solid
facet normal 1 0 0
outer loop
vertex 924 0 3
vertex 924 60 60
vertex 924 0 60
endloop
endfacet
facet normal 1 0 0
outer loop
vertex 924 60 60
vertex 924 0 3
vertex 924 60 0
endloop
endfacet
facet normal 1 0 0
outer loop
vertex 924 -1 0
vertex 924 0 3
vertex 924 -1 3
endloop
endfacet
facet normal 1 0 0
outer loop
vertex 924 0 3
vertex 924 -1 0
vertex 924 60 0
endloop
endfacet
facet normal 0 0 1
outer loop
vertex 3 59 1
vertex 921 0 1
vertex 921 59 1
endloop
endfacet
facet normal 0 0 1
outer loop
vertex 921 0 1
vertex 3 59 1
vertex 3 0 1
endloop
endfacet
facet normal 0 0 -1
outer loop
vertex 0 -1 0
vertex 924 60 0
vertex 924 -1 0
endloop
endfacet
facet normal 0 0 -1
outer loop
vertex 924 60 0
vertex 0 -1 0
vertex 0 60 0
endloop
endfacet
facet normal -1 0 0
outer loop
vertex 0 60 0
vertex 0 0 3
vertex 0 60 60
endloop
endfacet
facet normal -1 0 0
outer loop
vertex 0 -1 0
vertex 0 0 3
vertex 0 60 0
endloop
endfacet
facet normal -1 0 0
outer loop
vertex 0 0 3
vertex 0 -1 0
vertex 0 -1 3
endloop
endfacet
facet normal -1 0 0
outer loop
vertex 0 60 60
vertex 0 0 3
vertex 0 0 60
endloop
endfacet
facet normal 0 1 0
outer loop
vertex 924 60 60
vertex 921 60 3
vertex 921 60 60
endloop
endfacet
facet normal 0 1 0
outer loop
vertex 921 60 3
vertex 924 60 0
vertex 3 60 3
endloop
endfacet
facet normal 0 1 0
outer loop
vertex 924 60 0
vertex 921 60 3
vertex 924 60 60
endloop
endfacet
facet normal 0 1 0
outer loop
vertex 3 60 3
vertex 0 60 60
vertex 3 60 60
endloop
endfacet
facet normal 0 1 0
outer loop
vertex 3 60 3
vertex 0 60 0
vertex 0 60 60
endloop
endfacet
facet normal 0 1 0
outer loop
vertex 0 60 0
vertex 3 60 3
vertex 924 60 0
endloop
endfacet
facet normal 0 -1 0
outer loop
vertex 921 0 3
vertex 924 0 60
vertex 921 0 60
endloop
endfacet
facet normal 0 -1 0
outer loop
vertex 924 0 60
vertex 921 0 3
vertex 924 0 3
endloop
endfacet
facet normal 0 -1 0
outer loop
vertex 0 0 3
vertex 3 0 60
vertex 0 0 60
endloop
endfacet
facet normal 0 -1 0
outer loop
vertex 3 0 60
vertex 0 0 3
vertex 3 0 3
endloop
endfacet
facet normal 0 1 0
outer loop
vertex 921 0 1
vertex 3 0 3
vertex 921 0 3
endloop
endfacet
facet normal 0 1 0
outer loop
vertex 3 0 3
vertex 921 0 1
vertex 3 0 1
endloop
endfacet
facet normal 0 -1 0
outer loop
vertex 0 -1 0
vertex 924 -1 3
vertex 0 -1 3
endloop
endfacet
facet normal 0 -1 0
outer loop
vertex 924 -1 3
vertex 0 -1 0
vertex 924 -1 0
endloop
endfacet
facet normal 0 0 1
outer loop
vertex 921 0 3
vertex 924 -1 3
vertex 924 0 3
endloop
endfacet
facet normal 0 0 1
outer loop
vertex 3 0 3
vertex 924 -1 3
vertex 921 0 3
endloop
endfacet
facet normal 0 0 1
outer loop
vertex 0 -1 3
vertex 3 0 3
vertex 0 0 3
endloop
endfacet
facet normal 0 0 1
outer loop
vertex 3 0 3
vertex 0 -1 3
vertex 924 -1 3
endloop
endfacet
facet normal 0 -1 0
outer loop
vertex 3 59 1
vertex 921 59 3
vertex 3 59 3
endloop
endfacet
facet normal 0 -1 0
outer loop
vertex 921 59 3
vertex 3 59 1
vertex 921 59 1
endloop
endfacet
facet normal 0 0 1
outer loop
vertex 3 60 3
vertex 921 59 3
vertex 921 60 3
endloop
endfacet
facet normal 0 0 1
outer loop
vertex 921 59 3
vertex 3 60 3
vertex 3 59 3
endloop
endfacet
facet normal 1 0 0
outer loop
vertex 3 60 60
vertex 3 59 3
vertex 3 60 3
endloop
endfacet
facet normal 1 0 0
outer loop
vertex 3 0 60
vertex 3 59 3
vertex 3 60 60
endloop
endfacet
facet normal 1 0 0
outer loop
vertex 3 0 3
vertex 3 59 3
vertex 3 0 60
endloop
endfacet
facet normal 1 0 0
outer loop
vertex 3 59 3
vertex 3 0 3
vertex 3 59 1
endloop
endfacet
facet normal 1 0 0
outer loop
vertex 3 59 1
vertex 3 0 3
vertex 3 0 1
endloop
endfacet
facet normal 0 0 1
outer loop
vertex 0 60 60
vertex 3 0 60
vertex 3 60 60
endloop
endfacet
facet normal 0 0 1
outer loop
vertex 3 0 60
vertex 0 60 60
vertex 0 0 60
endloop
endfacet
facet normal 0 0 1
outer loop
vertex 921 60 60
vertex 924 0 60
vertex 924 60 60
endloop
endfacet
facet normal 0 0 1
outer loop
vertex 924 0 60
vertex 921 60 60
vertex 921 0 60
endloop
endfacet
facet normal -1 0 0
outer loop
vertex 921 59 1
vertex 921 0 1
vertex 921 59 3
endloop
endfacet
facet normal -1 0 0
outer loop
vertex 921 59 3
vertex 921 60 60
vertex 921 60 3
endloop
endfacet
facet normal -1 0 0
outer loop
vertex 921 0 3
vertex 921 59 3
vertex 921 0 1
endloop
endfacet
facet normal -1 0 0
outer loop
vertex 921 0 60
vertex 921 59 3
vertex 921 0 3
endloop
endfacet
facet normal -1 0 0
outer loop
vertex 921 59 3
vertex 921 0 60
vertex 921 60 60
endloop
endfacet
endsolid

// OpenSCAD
// file: grate.scad
include <../../library/profiles.scad>
include <./config.scad>


grateLength = floor(outerWidth - fireBasketWidth - (profileSize * 4) - (grateGap * 4) - ((4 * grateProfileThickness)));
grateWidth = outerDepth - profileSize - (6 * grateProfileThickness);
halfGrateLength = floor((grateLength - grateProfileThickness) / 2);

startPos = 17;

module grateTemplate(grateLength = 400, grateWidth = 400, frontProjection = false) {
    // hinten
    if (frontProjection) {
        cube([grateLength, profileSize - 5, profileSize - 5]);
    } else {
        cube([grateLength, profileSize + 5, profileSize + 5]);
    }
    // vorne
    translate([0, grateWidth - profileSize + 10 - grateGap * 2, 0])
    cube([grateLength, profileSize - 5 , profileSize - 5]);
    
    if (frontProjection) {
        // rippen
        amount = round(grateLength / 35);
        echo(str("anzahl ", amount))
        for ( i = [0 : amount - 1] ) {
            translate([(i * 35) + startPos, 0, profileSize - 5])
            rotate([45, 0, 90])
            lShapeProfile(grateWidth + 30, 20, 2);
        }
    } else {
        // rippen
        amount = round(grateLength / 35);
        echo(str("anzahl ", amount))
        for ( i = [0 : amount - 1] ) {
            translate([(i * 35) + startPos, 0, profileSize + 5])
            rotate([45, 1, 90])
            lShapeProfile(grateWidth + 30, 20, 2);
        }
    }
}

module grate() {
    grateTemplate(grateLength, grateWidth);
}

module halfGrate(frontProjection = false) {
    grateTemplate(halfGrateLength, grateWidth, frontProjection);
}

module halfGratePartsList() {
    amount = round(halfGrateLength / 35);
    echo(str("Nr,Beschreibung,Stück,Länge,Breite,Höhe"));

    // Träger
    echo(str("1,Vierkant Vorne", ",", "2", ",", halfGrateLength, ",", profileSize, ",", profileSize));
    echo(str("2,Vierkant Vorne", ",", "2", ",", halfGrateLength, ",", profileSize + 5, ",", profileSize + 5));
    // Rost
    echo(str("3,Winkel für Rost", ",", amount * 2, ",", grateWidth + 30, ",20,20"));

}


module drawHalfGrateFrontProjection() {

    // Vorne
    translate([halfGrateLength, -profileSize + 5, 0])
    projection() {
        rotate([90,0,180])
        halfGrate(frontProjection = true);
    }
}

module drawHalfGrateSideProjection() {
    translate([grateWidth + 30, -profileSize - 5, 0])
    // // Seite
    rotate([0,0,90])
    projection() {
        translate([0, 0, 0])
        rotate([0,90,0])
        halfGrate();
    }
}

module drawHalfGrateTopProjection() {
    // // Draufsicht
    translate([0, -grateWidth - 30, 0])
    projection() {
        rotate([0,0,0])
        halfGrate();
    }
}



module halfGrateMeasuermentLinesLength() {

    color([0/255, 0/255, 0/255]) translate([0, 60, 0]) {

        square([lineThickness,lineGap * 2 + 20]);

        translate([halfGrateLength, 0, 0])
        square([lineThickness,lineGap * 2 + 20]);


        amount = round(halfGrateLength / 35);

        for ( i = [0 : amount - 1] ) {
            moveX = halfGrateLength - ((i * 35) + startPos);
            translate([moveX, 0, 0])
            //translate([halfGrateLength, 0, 0])
            square([lineThickness,lineGap + 20]);
        }


        translate([-20, lineGap * 2, 0]) {
            length = halfGrateLength + 40;

            translate([length / 2, 15, 0])
            text(size = textSize, str(halfGrateLength));

            square([length, lineThickness]);
        }

        translate([-20, lineGap, 0]) {
            length = halfGrateLength + 40;

            for ( i = [0 : amount - 1] ) {
                moveX = halfGrateLength - ((i * 35) + startPos);
                translate([moveX, 15, 0])
                if (i == 0) {
                    translate([24, 0, 0])
                    text(size = textSize, str(startPos));
                } else {
                    translate([24, 0, 0])
                    text(size = textSize, str(35));
                }
            }


            translate([5, 15, 0])
            text(size = textSize, str(startPos));

            square([length, lineThickness]);
        }

    }
}

module halfGrateMeasermentLinesHeight() {

    color([0/255, 0/255, 0/255])  {
        translate([0, 0, 0]) {

            translate([0, 0, 0])
            square([lineThickness, lineGap + 20]);

            translate([profileSize - 5, 0, 0])
            square([lineThickness, lineGap + 20]);

            // top line
            translate([-20, lineGap, 0]) {
                length = profileSize - 5 + 40;

                translate([22, 15, 0])
                text(size = textSize, str(profileSize - 5));

                square([length, lineThickness]);
            }

        }
    }
}

module halfGrateMeasermentLinesHeightBack() {

    color([0/255, 0/255, 0/255])  {
        translate([0, 0, 0]) {

            translate([0, 0, 0])
            square([lineThickness, lineGap + 20]);

            translate([profileSize + 5, 0, 0])
            square([lineThickness, lineGap + 20]);

            // top line
            translate([-20, lineGap, 0]) {
                length = profileSize - 5 + 40;

                translate([25, 15, 0])
                text(size = textSize, str(profileSize + 5));

                square([length, lineThickness]);
            }

        }
    }
}

module halfGrateMeasermentLinesHeightFront() {

    color([0/255, 0/255, 0/255])  {
        translate([0, 30, 0]) {

            translate([0, 0, 0])
            square([lineThickness, lineGap + 20]);

            translate([profileSize - 5, 0, 0])
            square([lineThickness, lineGap + 20]);

            // top line
            translate([-20, lineGap, 0]) {
                length = profileSize - 5 + 40;

                translate([25, 15, 0])
                text(size = textSize, str(profileSize - 5));

                square([length, lineThickness]);
            }

        }
    }
}


module halfGrateMeasuermentLinesWidth() {


    color([0/255, 0/255, 0/255]) translate([0, 60, 0]) {
        ribLength = grateWidth + 30;

        square([lineThickness,lineGap * 2 + 20]);


        translate([ribLength - (profileSize + 5), 0, 0])
        square([lineThickness,lineGap + 20]);

        translate([ribLength - grateWidth + grateProfileThickness, 0, 0])
        square([lineThickness,lineGap + 20]);

        translate([ribLength - grateWidth + grateProfileThickness + (profileSize - 5), 0, 0])
        square([lineThickness,lineGap + 20]);

        translate([ribLength, 0, 0])
        square([lineThickness,lineGap * 2 + 20]);


        translate([-20, lineGap * 2, 0]) {
            length = ribLength + 40;

            translate([ribLength / 2, 15, 0])
            text(size = textSize, str(ribLength));

            square([length, lineThickness]);
        }

        translate([-20, lineGap, 0]) {
            length = ribLength + 40;

            translate([55, 15, 0])
            text(size = textSize, str(profileSize - 5));

            translate([ribLength / 2, 15, 0])
            text(size = textSize, str(grateWidth - profileSize * 2 - grateProfileThickness));


            translate([20, 15, 0])
            text(size = textSize, str(30 +  grateProfileThickness));


            translate([ribLength - 15, 15, 0])
            text(size = textSize, str(profileSize + 5));

            square([length, lineThickness]);
        }

        //cube([33, 100, 33]);
    }
}
// file: ../../library/profiles.scad
module lShapeProfile($length, $size, $thickness) {
    cube([$length, $size, $thickness]);
    rotate([90, 0, 0])
    translate([0, 0, -$thickness]) cube([$length, $size, $thickness]);
}


module uShapeProfile($length, $width, $height, $thickness) {
    cube([$length, $width, $thickness]);
    rotate([90, 0, 0])
    translate([0, 0, -$thickness]) cube([$length, $height, $thickness]);

    translate([0, $width, 0])
    rotate([90, 0, 0])
    cube([$length, $height, $thickness]);
}


module squareTubeProfile($length, $size, $thickness) {
    cube([$length, $size, $thickness]);

    rotate([90, 0, 0])
    translate([0, 0, -$thickness])
    cube([$length, $size, $thickness]);

    translate([0, $size, 0])
    rotate([90, 0, 0])
    cube([$length, $size, $thickness]);

    translate([0, 0, $size - $thickness])
    cube([$length, $size, $thickness]);
}
// file: config.scad
drawReferences = false;
drawReferenceWall = false;

outerWidth = 1500;
outerDepth = 700;
outerHeight = 700;

profileSize = 40;

fireBasketHeight = 250;
fireBasketWidth = 400;
fireBasketGroundClearance = 100;
fireBasketFrontOpen = true;

spindleDiameter  = 20;
spindleOverlength = 5;
spindleWallExtension = 140;
spindleWheelDiameter = 200;
spindlePlateThickness = 5;
spindlePlateGap = 2;
spindleHandleThickness = 8;

grateGap = 4;
grateSize = 30;
grateProfileThickness = 3;

lineThickness = 1;
lineGap = 80;
textSize = 20;

$fn = 120;
// main file
include <./config.scad>

use <./grateFrame.scad>


color([255/255, 127/255, 127/255])
collectingTray();


// start csv header
//grateFramePartsList();
